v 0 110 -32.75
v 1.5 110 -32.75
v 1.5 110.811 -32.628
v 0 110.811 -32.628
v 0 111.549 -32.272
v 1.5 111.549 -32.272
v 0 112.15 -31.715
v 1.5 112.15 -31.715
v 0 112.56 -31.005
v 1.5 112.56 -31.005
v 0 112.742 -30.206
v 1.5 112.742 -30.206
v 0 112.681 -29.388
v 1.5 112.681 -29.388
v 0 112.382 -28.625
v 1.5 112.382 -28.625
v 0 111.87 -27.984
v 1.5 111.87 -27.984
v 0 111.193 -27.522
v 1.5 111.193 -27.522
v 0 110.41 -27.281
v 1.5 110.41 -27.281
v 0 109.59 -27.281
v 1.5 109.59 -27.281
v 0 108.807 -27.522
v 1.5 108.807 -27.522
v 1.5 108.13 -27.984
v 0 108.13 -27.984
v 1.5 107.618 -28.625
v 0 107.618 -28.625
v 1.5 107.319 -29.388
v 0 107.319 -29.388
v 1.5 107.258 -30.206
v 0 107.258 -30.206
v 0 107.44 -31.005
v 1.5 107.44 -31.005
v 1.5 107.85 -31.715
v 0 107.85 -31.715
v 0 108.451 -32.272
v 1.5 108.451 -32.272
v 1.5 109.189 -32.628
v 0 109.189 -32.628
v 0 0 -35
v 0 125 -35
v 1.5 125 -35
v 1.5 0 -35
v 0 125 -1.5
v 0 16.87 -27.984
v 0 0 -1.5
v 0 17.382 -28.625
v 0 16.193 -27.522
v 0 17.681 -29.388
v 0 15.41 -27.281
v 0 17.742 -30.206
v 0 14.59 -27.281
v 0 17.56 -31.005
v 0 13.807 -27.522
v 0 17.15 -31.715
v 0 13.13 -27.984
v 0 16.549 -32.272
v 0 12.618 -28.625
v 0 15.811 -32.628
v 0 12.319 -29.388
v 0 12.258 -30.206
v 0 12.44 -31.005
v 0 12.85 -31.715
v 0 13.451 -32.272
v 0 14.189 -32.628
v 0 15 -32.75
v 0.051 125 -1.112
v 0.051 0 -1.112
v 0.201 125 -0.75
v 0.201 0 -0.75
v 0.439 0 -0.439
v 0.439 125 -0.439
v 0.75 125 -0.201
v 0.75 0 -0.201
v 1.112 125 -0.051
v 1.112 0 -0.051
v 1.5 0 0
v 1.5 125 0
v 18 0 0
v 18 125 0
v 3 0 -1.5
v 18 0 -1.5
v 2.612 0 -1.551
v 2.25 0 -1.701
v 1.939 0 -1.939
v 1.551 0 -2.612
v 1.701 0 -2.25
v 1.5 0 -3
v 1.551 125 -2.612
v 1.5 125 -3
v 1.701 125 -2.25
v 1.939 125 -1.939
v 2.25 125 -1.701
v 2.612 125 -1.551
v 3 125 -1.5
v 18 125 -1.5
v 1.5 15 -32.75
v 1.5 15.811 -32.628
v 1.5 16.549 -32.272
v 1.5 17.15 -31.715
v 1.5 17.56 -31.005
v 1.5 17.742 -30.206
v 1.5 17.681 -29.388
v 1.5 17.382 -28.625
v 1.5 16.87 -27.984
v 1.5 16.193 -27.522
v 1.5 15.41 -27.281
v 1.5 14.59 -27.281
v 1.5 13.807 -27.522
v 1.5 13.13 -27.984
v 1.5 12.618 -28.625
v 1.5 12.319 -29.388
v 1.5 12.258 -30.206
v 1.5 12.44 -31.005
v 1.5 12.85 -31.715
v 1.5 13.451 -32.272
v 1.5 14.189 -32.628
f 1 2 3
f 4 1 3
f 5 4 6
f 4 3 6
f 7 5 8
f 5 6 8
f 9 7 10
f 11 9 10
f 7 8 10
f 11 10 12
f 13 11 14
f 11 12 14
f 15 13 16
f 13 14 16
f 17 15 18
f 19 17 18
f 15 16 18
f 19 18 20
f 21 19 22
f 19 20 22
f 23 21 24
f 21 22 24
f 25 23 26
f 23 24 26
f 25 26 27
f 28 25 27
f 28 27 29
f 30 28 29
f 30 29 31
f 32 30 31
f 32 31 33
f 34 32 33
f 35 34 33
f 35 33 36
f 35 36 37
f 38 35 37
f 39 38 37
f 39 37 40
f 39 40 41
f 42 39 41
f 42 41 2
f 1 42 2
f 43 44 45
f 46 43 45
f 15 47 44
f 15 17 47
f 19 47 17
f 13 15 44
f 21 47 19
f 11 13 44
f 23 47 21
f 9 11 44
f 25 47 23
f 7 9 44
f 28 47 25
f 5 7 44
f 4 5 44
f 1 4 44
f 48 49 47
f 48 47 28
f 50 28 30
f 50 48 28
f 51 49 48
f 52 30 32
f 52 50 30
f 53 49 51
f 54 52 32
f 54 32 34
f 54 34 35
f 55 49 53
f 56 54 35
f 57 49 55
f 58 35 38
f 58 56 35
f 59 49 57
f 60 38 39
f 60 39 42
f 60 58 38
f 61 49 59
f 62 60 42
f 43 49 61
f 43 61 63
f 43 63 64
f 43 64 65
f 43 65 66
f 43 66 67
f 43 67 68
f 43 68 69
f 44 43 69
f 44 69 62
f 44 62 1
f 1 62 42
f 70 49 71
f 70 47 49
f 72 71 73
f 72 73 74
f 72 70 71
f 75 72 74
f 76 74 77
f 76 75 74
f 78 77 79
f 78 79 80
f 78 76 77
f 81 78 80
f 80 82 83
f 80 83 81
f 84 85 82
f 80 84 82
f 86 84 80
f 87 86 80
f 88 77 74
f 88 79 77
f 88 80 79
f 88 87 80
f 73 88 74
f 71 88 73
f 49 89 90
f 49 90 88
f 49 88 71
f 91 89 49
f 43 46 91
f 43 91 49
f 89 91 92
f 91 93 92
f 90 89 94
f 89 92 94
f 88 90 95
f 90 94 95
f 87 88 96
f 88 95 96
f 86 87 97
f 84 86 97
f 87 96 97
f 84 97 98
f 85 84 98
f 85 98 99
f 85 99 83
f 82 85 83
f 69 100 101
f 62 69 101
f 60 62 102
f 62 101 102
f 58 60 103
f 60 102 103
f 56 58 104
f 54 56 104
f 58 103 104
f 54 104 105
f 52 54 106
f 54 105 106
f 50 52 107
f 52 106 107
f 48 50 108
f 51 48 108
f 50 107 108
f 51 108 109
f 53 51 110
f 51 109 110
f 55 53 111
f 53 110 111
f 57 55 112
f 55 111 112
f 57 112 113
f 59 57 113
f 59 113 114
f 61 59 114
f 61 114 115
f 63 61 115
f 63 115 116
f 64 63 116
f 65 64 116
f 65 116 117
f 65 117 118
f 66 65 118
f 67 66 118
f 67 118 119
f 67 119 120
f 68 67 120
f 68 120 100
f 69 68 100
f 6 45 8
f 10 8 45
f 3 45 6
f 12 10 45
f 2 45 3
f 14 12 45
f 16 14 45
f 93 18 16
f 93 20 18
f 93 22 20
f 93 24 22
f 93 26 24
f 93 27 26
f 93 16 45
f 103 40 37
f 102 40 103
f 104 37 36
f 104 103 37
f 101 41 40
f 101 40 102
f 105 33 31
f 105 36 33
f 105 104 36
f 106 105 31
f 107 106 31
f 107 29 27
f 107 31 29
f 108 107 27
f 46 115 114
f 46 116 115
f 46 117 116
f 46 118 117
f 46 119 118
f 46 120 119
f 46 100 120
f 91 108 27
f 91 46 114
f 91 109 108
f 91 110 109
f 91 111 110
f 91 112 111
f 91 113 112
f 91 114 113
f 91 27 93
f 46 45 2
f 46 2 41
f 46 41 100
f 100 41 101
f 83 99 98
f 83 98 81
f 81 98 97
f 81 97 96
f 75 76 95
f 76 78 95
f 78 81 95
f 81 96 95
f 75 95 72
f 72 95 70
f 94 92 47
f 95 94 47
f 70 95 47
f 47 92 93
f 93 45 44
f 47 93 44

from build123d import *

# Parameters (mm, degrees)
BOSS_EXTRUDE1_DEPTH = 125
FILLET1_R           = 1.5
FILLET2_R           = 1.5
SKETCH2_R           = 2.75
CUT_EXTRUDE1_DEPTH  = 2.5


with BuildPart() as part:
    # Sketch1 → Boss-Extrude1 (new body)
    with BuildSketch(Plane(origin=(0, 0, 0), x_dir=(1, 0, 0), z_dir=(0, 1, 0))):
        Polygon((0, 0), (0, 35), (1.5, 35), (1.5, 1.5), (18, 1.5), (18, 0), align=None)
    extrude(amount=BOSS_EXTRUDE1_DEPTH)

    # Fillet1
    fillet1_edges = [part.edges().sort_by_distance(p)[0] for p in [
        (1.5, 62.5, -1.5),
    ]]
    fillet(fillet1_edges, radius=FILLET1_R)

    # Fillet2
    fillet2_edges = [part.edges().sort_by_distance(p)[0] for p in [
        (0, 62.5, 0),
    ]]
    fillet(fillet2_edges, radius=FILLET2_R)

    # Sketch2 → Cut-Extrude1 (cut, through all)
    with BuildSketch(Plane(origin=(1.5, 0, 0), x_dir=(0, 0, -1), z_dir=(1, 0, 0))):
        with Locations((30, 110)):
            Circle(SKETCH2_R)
        with Locations((30, 15)):
            Circle(SKETCH2_R)
    extrude(amount=-CUT_EXTRUDE1_DEPTH, mode=Mode.SUBTRACT)


solid = part.part
